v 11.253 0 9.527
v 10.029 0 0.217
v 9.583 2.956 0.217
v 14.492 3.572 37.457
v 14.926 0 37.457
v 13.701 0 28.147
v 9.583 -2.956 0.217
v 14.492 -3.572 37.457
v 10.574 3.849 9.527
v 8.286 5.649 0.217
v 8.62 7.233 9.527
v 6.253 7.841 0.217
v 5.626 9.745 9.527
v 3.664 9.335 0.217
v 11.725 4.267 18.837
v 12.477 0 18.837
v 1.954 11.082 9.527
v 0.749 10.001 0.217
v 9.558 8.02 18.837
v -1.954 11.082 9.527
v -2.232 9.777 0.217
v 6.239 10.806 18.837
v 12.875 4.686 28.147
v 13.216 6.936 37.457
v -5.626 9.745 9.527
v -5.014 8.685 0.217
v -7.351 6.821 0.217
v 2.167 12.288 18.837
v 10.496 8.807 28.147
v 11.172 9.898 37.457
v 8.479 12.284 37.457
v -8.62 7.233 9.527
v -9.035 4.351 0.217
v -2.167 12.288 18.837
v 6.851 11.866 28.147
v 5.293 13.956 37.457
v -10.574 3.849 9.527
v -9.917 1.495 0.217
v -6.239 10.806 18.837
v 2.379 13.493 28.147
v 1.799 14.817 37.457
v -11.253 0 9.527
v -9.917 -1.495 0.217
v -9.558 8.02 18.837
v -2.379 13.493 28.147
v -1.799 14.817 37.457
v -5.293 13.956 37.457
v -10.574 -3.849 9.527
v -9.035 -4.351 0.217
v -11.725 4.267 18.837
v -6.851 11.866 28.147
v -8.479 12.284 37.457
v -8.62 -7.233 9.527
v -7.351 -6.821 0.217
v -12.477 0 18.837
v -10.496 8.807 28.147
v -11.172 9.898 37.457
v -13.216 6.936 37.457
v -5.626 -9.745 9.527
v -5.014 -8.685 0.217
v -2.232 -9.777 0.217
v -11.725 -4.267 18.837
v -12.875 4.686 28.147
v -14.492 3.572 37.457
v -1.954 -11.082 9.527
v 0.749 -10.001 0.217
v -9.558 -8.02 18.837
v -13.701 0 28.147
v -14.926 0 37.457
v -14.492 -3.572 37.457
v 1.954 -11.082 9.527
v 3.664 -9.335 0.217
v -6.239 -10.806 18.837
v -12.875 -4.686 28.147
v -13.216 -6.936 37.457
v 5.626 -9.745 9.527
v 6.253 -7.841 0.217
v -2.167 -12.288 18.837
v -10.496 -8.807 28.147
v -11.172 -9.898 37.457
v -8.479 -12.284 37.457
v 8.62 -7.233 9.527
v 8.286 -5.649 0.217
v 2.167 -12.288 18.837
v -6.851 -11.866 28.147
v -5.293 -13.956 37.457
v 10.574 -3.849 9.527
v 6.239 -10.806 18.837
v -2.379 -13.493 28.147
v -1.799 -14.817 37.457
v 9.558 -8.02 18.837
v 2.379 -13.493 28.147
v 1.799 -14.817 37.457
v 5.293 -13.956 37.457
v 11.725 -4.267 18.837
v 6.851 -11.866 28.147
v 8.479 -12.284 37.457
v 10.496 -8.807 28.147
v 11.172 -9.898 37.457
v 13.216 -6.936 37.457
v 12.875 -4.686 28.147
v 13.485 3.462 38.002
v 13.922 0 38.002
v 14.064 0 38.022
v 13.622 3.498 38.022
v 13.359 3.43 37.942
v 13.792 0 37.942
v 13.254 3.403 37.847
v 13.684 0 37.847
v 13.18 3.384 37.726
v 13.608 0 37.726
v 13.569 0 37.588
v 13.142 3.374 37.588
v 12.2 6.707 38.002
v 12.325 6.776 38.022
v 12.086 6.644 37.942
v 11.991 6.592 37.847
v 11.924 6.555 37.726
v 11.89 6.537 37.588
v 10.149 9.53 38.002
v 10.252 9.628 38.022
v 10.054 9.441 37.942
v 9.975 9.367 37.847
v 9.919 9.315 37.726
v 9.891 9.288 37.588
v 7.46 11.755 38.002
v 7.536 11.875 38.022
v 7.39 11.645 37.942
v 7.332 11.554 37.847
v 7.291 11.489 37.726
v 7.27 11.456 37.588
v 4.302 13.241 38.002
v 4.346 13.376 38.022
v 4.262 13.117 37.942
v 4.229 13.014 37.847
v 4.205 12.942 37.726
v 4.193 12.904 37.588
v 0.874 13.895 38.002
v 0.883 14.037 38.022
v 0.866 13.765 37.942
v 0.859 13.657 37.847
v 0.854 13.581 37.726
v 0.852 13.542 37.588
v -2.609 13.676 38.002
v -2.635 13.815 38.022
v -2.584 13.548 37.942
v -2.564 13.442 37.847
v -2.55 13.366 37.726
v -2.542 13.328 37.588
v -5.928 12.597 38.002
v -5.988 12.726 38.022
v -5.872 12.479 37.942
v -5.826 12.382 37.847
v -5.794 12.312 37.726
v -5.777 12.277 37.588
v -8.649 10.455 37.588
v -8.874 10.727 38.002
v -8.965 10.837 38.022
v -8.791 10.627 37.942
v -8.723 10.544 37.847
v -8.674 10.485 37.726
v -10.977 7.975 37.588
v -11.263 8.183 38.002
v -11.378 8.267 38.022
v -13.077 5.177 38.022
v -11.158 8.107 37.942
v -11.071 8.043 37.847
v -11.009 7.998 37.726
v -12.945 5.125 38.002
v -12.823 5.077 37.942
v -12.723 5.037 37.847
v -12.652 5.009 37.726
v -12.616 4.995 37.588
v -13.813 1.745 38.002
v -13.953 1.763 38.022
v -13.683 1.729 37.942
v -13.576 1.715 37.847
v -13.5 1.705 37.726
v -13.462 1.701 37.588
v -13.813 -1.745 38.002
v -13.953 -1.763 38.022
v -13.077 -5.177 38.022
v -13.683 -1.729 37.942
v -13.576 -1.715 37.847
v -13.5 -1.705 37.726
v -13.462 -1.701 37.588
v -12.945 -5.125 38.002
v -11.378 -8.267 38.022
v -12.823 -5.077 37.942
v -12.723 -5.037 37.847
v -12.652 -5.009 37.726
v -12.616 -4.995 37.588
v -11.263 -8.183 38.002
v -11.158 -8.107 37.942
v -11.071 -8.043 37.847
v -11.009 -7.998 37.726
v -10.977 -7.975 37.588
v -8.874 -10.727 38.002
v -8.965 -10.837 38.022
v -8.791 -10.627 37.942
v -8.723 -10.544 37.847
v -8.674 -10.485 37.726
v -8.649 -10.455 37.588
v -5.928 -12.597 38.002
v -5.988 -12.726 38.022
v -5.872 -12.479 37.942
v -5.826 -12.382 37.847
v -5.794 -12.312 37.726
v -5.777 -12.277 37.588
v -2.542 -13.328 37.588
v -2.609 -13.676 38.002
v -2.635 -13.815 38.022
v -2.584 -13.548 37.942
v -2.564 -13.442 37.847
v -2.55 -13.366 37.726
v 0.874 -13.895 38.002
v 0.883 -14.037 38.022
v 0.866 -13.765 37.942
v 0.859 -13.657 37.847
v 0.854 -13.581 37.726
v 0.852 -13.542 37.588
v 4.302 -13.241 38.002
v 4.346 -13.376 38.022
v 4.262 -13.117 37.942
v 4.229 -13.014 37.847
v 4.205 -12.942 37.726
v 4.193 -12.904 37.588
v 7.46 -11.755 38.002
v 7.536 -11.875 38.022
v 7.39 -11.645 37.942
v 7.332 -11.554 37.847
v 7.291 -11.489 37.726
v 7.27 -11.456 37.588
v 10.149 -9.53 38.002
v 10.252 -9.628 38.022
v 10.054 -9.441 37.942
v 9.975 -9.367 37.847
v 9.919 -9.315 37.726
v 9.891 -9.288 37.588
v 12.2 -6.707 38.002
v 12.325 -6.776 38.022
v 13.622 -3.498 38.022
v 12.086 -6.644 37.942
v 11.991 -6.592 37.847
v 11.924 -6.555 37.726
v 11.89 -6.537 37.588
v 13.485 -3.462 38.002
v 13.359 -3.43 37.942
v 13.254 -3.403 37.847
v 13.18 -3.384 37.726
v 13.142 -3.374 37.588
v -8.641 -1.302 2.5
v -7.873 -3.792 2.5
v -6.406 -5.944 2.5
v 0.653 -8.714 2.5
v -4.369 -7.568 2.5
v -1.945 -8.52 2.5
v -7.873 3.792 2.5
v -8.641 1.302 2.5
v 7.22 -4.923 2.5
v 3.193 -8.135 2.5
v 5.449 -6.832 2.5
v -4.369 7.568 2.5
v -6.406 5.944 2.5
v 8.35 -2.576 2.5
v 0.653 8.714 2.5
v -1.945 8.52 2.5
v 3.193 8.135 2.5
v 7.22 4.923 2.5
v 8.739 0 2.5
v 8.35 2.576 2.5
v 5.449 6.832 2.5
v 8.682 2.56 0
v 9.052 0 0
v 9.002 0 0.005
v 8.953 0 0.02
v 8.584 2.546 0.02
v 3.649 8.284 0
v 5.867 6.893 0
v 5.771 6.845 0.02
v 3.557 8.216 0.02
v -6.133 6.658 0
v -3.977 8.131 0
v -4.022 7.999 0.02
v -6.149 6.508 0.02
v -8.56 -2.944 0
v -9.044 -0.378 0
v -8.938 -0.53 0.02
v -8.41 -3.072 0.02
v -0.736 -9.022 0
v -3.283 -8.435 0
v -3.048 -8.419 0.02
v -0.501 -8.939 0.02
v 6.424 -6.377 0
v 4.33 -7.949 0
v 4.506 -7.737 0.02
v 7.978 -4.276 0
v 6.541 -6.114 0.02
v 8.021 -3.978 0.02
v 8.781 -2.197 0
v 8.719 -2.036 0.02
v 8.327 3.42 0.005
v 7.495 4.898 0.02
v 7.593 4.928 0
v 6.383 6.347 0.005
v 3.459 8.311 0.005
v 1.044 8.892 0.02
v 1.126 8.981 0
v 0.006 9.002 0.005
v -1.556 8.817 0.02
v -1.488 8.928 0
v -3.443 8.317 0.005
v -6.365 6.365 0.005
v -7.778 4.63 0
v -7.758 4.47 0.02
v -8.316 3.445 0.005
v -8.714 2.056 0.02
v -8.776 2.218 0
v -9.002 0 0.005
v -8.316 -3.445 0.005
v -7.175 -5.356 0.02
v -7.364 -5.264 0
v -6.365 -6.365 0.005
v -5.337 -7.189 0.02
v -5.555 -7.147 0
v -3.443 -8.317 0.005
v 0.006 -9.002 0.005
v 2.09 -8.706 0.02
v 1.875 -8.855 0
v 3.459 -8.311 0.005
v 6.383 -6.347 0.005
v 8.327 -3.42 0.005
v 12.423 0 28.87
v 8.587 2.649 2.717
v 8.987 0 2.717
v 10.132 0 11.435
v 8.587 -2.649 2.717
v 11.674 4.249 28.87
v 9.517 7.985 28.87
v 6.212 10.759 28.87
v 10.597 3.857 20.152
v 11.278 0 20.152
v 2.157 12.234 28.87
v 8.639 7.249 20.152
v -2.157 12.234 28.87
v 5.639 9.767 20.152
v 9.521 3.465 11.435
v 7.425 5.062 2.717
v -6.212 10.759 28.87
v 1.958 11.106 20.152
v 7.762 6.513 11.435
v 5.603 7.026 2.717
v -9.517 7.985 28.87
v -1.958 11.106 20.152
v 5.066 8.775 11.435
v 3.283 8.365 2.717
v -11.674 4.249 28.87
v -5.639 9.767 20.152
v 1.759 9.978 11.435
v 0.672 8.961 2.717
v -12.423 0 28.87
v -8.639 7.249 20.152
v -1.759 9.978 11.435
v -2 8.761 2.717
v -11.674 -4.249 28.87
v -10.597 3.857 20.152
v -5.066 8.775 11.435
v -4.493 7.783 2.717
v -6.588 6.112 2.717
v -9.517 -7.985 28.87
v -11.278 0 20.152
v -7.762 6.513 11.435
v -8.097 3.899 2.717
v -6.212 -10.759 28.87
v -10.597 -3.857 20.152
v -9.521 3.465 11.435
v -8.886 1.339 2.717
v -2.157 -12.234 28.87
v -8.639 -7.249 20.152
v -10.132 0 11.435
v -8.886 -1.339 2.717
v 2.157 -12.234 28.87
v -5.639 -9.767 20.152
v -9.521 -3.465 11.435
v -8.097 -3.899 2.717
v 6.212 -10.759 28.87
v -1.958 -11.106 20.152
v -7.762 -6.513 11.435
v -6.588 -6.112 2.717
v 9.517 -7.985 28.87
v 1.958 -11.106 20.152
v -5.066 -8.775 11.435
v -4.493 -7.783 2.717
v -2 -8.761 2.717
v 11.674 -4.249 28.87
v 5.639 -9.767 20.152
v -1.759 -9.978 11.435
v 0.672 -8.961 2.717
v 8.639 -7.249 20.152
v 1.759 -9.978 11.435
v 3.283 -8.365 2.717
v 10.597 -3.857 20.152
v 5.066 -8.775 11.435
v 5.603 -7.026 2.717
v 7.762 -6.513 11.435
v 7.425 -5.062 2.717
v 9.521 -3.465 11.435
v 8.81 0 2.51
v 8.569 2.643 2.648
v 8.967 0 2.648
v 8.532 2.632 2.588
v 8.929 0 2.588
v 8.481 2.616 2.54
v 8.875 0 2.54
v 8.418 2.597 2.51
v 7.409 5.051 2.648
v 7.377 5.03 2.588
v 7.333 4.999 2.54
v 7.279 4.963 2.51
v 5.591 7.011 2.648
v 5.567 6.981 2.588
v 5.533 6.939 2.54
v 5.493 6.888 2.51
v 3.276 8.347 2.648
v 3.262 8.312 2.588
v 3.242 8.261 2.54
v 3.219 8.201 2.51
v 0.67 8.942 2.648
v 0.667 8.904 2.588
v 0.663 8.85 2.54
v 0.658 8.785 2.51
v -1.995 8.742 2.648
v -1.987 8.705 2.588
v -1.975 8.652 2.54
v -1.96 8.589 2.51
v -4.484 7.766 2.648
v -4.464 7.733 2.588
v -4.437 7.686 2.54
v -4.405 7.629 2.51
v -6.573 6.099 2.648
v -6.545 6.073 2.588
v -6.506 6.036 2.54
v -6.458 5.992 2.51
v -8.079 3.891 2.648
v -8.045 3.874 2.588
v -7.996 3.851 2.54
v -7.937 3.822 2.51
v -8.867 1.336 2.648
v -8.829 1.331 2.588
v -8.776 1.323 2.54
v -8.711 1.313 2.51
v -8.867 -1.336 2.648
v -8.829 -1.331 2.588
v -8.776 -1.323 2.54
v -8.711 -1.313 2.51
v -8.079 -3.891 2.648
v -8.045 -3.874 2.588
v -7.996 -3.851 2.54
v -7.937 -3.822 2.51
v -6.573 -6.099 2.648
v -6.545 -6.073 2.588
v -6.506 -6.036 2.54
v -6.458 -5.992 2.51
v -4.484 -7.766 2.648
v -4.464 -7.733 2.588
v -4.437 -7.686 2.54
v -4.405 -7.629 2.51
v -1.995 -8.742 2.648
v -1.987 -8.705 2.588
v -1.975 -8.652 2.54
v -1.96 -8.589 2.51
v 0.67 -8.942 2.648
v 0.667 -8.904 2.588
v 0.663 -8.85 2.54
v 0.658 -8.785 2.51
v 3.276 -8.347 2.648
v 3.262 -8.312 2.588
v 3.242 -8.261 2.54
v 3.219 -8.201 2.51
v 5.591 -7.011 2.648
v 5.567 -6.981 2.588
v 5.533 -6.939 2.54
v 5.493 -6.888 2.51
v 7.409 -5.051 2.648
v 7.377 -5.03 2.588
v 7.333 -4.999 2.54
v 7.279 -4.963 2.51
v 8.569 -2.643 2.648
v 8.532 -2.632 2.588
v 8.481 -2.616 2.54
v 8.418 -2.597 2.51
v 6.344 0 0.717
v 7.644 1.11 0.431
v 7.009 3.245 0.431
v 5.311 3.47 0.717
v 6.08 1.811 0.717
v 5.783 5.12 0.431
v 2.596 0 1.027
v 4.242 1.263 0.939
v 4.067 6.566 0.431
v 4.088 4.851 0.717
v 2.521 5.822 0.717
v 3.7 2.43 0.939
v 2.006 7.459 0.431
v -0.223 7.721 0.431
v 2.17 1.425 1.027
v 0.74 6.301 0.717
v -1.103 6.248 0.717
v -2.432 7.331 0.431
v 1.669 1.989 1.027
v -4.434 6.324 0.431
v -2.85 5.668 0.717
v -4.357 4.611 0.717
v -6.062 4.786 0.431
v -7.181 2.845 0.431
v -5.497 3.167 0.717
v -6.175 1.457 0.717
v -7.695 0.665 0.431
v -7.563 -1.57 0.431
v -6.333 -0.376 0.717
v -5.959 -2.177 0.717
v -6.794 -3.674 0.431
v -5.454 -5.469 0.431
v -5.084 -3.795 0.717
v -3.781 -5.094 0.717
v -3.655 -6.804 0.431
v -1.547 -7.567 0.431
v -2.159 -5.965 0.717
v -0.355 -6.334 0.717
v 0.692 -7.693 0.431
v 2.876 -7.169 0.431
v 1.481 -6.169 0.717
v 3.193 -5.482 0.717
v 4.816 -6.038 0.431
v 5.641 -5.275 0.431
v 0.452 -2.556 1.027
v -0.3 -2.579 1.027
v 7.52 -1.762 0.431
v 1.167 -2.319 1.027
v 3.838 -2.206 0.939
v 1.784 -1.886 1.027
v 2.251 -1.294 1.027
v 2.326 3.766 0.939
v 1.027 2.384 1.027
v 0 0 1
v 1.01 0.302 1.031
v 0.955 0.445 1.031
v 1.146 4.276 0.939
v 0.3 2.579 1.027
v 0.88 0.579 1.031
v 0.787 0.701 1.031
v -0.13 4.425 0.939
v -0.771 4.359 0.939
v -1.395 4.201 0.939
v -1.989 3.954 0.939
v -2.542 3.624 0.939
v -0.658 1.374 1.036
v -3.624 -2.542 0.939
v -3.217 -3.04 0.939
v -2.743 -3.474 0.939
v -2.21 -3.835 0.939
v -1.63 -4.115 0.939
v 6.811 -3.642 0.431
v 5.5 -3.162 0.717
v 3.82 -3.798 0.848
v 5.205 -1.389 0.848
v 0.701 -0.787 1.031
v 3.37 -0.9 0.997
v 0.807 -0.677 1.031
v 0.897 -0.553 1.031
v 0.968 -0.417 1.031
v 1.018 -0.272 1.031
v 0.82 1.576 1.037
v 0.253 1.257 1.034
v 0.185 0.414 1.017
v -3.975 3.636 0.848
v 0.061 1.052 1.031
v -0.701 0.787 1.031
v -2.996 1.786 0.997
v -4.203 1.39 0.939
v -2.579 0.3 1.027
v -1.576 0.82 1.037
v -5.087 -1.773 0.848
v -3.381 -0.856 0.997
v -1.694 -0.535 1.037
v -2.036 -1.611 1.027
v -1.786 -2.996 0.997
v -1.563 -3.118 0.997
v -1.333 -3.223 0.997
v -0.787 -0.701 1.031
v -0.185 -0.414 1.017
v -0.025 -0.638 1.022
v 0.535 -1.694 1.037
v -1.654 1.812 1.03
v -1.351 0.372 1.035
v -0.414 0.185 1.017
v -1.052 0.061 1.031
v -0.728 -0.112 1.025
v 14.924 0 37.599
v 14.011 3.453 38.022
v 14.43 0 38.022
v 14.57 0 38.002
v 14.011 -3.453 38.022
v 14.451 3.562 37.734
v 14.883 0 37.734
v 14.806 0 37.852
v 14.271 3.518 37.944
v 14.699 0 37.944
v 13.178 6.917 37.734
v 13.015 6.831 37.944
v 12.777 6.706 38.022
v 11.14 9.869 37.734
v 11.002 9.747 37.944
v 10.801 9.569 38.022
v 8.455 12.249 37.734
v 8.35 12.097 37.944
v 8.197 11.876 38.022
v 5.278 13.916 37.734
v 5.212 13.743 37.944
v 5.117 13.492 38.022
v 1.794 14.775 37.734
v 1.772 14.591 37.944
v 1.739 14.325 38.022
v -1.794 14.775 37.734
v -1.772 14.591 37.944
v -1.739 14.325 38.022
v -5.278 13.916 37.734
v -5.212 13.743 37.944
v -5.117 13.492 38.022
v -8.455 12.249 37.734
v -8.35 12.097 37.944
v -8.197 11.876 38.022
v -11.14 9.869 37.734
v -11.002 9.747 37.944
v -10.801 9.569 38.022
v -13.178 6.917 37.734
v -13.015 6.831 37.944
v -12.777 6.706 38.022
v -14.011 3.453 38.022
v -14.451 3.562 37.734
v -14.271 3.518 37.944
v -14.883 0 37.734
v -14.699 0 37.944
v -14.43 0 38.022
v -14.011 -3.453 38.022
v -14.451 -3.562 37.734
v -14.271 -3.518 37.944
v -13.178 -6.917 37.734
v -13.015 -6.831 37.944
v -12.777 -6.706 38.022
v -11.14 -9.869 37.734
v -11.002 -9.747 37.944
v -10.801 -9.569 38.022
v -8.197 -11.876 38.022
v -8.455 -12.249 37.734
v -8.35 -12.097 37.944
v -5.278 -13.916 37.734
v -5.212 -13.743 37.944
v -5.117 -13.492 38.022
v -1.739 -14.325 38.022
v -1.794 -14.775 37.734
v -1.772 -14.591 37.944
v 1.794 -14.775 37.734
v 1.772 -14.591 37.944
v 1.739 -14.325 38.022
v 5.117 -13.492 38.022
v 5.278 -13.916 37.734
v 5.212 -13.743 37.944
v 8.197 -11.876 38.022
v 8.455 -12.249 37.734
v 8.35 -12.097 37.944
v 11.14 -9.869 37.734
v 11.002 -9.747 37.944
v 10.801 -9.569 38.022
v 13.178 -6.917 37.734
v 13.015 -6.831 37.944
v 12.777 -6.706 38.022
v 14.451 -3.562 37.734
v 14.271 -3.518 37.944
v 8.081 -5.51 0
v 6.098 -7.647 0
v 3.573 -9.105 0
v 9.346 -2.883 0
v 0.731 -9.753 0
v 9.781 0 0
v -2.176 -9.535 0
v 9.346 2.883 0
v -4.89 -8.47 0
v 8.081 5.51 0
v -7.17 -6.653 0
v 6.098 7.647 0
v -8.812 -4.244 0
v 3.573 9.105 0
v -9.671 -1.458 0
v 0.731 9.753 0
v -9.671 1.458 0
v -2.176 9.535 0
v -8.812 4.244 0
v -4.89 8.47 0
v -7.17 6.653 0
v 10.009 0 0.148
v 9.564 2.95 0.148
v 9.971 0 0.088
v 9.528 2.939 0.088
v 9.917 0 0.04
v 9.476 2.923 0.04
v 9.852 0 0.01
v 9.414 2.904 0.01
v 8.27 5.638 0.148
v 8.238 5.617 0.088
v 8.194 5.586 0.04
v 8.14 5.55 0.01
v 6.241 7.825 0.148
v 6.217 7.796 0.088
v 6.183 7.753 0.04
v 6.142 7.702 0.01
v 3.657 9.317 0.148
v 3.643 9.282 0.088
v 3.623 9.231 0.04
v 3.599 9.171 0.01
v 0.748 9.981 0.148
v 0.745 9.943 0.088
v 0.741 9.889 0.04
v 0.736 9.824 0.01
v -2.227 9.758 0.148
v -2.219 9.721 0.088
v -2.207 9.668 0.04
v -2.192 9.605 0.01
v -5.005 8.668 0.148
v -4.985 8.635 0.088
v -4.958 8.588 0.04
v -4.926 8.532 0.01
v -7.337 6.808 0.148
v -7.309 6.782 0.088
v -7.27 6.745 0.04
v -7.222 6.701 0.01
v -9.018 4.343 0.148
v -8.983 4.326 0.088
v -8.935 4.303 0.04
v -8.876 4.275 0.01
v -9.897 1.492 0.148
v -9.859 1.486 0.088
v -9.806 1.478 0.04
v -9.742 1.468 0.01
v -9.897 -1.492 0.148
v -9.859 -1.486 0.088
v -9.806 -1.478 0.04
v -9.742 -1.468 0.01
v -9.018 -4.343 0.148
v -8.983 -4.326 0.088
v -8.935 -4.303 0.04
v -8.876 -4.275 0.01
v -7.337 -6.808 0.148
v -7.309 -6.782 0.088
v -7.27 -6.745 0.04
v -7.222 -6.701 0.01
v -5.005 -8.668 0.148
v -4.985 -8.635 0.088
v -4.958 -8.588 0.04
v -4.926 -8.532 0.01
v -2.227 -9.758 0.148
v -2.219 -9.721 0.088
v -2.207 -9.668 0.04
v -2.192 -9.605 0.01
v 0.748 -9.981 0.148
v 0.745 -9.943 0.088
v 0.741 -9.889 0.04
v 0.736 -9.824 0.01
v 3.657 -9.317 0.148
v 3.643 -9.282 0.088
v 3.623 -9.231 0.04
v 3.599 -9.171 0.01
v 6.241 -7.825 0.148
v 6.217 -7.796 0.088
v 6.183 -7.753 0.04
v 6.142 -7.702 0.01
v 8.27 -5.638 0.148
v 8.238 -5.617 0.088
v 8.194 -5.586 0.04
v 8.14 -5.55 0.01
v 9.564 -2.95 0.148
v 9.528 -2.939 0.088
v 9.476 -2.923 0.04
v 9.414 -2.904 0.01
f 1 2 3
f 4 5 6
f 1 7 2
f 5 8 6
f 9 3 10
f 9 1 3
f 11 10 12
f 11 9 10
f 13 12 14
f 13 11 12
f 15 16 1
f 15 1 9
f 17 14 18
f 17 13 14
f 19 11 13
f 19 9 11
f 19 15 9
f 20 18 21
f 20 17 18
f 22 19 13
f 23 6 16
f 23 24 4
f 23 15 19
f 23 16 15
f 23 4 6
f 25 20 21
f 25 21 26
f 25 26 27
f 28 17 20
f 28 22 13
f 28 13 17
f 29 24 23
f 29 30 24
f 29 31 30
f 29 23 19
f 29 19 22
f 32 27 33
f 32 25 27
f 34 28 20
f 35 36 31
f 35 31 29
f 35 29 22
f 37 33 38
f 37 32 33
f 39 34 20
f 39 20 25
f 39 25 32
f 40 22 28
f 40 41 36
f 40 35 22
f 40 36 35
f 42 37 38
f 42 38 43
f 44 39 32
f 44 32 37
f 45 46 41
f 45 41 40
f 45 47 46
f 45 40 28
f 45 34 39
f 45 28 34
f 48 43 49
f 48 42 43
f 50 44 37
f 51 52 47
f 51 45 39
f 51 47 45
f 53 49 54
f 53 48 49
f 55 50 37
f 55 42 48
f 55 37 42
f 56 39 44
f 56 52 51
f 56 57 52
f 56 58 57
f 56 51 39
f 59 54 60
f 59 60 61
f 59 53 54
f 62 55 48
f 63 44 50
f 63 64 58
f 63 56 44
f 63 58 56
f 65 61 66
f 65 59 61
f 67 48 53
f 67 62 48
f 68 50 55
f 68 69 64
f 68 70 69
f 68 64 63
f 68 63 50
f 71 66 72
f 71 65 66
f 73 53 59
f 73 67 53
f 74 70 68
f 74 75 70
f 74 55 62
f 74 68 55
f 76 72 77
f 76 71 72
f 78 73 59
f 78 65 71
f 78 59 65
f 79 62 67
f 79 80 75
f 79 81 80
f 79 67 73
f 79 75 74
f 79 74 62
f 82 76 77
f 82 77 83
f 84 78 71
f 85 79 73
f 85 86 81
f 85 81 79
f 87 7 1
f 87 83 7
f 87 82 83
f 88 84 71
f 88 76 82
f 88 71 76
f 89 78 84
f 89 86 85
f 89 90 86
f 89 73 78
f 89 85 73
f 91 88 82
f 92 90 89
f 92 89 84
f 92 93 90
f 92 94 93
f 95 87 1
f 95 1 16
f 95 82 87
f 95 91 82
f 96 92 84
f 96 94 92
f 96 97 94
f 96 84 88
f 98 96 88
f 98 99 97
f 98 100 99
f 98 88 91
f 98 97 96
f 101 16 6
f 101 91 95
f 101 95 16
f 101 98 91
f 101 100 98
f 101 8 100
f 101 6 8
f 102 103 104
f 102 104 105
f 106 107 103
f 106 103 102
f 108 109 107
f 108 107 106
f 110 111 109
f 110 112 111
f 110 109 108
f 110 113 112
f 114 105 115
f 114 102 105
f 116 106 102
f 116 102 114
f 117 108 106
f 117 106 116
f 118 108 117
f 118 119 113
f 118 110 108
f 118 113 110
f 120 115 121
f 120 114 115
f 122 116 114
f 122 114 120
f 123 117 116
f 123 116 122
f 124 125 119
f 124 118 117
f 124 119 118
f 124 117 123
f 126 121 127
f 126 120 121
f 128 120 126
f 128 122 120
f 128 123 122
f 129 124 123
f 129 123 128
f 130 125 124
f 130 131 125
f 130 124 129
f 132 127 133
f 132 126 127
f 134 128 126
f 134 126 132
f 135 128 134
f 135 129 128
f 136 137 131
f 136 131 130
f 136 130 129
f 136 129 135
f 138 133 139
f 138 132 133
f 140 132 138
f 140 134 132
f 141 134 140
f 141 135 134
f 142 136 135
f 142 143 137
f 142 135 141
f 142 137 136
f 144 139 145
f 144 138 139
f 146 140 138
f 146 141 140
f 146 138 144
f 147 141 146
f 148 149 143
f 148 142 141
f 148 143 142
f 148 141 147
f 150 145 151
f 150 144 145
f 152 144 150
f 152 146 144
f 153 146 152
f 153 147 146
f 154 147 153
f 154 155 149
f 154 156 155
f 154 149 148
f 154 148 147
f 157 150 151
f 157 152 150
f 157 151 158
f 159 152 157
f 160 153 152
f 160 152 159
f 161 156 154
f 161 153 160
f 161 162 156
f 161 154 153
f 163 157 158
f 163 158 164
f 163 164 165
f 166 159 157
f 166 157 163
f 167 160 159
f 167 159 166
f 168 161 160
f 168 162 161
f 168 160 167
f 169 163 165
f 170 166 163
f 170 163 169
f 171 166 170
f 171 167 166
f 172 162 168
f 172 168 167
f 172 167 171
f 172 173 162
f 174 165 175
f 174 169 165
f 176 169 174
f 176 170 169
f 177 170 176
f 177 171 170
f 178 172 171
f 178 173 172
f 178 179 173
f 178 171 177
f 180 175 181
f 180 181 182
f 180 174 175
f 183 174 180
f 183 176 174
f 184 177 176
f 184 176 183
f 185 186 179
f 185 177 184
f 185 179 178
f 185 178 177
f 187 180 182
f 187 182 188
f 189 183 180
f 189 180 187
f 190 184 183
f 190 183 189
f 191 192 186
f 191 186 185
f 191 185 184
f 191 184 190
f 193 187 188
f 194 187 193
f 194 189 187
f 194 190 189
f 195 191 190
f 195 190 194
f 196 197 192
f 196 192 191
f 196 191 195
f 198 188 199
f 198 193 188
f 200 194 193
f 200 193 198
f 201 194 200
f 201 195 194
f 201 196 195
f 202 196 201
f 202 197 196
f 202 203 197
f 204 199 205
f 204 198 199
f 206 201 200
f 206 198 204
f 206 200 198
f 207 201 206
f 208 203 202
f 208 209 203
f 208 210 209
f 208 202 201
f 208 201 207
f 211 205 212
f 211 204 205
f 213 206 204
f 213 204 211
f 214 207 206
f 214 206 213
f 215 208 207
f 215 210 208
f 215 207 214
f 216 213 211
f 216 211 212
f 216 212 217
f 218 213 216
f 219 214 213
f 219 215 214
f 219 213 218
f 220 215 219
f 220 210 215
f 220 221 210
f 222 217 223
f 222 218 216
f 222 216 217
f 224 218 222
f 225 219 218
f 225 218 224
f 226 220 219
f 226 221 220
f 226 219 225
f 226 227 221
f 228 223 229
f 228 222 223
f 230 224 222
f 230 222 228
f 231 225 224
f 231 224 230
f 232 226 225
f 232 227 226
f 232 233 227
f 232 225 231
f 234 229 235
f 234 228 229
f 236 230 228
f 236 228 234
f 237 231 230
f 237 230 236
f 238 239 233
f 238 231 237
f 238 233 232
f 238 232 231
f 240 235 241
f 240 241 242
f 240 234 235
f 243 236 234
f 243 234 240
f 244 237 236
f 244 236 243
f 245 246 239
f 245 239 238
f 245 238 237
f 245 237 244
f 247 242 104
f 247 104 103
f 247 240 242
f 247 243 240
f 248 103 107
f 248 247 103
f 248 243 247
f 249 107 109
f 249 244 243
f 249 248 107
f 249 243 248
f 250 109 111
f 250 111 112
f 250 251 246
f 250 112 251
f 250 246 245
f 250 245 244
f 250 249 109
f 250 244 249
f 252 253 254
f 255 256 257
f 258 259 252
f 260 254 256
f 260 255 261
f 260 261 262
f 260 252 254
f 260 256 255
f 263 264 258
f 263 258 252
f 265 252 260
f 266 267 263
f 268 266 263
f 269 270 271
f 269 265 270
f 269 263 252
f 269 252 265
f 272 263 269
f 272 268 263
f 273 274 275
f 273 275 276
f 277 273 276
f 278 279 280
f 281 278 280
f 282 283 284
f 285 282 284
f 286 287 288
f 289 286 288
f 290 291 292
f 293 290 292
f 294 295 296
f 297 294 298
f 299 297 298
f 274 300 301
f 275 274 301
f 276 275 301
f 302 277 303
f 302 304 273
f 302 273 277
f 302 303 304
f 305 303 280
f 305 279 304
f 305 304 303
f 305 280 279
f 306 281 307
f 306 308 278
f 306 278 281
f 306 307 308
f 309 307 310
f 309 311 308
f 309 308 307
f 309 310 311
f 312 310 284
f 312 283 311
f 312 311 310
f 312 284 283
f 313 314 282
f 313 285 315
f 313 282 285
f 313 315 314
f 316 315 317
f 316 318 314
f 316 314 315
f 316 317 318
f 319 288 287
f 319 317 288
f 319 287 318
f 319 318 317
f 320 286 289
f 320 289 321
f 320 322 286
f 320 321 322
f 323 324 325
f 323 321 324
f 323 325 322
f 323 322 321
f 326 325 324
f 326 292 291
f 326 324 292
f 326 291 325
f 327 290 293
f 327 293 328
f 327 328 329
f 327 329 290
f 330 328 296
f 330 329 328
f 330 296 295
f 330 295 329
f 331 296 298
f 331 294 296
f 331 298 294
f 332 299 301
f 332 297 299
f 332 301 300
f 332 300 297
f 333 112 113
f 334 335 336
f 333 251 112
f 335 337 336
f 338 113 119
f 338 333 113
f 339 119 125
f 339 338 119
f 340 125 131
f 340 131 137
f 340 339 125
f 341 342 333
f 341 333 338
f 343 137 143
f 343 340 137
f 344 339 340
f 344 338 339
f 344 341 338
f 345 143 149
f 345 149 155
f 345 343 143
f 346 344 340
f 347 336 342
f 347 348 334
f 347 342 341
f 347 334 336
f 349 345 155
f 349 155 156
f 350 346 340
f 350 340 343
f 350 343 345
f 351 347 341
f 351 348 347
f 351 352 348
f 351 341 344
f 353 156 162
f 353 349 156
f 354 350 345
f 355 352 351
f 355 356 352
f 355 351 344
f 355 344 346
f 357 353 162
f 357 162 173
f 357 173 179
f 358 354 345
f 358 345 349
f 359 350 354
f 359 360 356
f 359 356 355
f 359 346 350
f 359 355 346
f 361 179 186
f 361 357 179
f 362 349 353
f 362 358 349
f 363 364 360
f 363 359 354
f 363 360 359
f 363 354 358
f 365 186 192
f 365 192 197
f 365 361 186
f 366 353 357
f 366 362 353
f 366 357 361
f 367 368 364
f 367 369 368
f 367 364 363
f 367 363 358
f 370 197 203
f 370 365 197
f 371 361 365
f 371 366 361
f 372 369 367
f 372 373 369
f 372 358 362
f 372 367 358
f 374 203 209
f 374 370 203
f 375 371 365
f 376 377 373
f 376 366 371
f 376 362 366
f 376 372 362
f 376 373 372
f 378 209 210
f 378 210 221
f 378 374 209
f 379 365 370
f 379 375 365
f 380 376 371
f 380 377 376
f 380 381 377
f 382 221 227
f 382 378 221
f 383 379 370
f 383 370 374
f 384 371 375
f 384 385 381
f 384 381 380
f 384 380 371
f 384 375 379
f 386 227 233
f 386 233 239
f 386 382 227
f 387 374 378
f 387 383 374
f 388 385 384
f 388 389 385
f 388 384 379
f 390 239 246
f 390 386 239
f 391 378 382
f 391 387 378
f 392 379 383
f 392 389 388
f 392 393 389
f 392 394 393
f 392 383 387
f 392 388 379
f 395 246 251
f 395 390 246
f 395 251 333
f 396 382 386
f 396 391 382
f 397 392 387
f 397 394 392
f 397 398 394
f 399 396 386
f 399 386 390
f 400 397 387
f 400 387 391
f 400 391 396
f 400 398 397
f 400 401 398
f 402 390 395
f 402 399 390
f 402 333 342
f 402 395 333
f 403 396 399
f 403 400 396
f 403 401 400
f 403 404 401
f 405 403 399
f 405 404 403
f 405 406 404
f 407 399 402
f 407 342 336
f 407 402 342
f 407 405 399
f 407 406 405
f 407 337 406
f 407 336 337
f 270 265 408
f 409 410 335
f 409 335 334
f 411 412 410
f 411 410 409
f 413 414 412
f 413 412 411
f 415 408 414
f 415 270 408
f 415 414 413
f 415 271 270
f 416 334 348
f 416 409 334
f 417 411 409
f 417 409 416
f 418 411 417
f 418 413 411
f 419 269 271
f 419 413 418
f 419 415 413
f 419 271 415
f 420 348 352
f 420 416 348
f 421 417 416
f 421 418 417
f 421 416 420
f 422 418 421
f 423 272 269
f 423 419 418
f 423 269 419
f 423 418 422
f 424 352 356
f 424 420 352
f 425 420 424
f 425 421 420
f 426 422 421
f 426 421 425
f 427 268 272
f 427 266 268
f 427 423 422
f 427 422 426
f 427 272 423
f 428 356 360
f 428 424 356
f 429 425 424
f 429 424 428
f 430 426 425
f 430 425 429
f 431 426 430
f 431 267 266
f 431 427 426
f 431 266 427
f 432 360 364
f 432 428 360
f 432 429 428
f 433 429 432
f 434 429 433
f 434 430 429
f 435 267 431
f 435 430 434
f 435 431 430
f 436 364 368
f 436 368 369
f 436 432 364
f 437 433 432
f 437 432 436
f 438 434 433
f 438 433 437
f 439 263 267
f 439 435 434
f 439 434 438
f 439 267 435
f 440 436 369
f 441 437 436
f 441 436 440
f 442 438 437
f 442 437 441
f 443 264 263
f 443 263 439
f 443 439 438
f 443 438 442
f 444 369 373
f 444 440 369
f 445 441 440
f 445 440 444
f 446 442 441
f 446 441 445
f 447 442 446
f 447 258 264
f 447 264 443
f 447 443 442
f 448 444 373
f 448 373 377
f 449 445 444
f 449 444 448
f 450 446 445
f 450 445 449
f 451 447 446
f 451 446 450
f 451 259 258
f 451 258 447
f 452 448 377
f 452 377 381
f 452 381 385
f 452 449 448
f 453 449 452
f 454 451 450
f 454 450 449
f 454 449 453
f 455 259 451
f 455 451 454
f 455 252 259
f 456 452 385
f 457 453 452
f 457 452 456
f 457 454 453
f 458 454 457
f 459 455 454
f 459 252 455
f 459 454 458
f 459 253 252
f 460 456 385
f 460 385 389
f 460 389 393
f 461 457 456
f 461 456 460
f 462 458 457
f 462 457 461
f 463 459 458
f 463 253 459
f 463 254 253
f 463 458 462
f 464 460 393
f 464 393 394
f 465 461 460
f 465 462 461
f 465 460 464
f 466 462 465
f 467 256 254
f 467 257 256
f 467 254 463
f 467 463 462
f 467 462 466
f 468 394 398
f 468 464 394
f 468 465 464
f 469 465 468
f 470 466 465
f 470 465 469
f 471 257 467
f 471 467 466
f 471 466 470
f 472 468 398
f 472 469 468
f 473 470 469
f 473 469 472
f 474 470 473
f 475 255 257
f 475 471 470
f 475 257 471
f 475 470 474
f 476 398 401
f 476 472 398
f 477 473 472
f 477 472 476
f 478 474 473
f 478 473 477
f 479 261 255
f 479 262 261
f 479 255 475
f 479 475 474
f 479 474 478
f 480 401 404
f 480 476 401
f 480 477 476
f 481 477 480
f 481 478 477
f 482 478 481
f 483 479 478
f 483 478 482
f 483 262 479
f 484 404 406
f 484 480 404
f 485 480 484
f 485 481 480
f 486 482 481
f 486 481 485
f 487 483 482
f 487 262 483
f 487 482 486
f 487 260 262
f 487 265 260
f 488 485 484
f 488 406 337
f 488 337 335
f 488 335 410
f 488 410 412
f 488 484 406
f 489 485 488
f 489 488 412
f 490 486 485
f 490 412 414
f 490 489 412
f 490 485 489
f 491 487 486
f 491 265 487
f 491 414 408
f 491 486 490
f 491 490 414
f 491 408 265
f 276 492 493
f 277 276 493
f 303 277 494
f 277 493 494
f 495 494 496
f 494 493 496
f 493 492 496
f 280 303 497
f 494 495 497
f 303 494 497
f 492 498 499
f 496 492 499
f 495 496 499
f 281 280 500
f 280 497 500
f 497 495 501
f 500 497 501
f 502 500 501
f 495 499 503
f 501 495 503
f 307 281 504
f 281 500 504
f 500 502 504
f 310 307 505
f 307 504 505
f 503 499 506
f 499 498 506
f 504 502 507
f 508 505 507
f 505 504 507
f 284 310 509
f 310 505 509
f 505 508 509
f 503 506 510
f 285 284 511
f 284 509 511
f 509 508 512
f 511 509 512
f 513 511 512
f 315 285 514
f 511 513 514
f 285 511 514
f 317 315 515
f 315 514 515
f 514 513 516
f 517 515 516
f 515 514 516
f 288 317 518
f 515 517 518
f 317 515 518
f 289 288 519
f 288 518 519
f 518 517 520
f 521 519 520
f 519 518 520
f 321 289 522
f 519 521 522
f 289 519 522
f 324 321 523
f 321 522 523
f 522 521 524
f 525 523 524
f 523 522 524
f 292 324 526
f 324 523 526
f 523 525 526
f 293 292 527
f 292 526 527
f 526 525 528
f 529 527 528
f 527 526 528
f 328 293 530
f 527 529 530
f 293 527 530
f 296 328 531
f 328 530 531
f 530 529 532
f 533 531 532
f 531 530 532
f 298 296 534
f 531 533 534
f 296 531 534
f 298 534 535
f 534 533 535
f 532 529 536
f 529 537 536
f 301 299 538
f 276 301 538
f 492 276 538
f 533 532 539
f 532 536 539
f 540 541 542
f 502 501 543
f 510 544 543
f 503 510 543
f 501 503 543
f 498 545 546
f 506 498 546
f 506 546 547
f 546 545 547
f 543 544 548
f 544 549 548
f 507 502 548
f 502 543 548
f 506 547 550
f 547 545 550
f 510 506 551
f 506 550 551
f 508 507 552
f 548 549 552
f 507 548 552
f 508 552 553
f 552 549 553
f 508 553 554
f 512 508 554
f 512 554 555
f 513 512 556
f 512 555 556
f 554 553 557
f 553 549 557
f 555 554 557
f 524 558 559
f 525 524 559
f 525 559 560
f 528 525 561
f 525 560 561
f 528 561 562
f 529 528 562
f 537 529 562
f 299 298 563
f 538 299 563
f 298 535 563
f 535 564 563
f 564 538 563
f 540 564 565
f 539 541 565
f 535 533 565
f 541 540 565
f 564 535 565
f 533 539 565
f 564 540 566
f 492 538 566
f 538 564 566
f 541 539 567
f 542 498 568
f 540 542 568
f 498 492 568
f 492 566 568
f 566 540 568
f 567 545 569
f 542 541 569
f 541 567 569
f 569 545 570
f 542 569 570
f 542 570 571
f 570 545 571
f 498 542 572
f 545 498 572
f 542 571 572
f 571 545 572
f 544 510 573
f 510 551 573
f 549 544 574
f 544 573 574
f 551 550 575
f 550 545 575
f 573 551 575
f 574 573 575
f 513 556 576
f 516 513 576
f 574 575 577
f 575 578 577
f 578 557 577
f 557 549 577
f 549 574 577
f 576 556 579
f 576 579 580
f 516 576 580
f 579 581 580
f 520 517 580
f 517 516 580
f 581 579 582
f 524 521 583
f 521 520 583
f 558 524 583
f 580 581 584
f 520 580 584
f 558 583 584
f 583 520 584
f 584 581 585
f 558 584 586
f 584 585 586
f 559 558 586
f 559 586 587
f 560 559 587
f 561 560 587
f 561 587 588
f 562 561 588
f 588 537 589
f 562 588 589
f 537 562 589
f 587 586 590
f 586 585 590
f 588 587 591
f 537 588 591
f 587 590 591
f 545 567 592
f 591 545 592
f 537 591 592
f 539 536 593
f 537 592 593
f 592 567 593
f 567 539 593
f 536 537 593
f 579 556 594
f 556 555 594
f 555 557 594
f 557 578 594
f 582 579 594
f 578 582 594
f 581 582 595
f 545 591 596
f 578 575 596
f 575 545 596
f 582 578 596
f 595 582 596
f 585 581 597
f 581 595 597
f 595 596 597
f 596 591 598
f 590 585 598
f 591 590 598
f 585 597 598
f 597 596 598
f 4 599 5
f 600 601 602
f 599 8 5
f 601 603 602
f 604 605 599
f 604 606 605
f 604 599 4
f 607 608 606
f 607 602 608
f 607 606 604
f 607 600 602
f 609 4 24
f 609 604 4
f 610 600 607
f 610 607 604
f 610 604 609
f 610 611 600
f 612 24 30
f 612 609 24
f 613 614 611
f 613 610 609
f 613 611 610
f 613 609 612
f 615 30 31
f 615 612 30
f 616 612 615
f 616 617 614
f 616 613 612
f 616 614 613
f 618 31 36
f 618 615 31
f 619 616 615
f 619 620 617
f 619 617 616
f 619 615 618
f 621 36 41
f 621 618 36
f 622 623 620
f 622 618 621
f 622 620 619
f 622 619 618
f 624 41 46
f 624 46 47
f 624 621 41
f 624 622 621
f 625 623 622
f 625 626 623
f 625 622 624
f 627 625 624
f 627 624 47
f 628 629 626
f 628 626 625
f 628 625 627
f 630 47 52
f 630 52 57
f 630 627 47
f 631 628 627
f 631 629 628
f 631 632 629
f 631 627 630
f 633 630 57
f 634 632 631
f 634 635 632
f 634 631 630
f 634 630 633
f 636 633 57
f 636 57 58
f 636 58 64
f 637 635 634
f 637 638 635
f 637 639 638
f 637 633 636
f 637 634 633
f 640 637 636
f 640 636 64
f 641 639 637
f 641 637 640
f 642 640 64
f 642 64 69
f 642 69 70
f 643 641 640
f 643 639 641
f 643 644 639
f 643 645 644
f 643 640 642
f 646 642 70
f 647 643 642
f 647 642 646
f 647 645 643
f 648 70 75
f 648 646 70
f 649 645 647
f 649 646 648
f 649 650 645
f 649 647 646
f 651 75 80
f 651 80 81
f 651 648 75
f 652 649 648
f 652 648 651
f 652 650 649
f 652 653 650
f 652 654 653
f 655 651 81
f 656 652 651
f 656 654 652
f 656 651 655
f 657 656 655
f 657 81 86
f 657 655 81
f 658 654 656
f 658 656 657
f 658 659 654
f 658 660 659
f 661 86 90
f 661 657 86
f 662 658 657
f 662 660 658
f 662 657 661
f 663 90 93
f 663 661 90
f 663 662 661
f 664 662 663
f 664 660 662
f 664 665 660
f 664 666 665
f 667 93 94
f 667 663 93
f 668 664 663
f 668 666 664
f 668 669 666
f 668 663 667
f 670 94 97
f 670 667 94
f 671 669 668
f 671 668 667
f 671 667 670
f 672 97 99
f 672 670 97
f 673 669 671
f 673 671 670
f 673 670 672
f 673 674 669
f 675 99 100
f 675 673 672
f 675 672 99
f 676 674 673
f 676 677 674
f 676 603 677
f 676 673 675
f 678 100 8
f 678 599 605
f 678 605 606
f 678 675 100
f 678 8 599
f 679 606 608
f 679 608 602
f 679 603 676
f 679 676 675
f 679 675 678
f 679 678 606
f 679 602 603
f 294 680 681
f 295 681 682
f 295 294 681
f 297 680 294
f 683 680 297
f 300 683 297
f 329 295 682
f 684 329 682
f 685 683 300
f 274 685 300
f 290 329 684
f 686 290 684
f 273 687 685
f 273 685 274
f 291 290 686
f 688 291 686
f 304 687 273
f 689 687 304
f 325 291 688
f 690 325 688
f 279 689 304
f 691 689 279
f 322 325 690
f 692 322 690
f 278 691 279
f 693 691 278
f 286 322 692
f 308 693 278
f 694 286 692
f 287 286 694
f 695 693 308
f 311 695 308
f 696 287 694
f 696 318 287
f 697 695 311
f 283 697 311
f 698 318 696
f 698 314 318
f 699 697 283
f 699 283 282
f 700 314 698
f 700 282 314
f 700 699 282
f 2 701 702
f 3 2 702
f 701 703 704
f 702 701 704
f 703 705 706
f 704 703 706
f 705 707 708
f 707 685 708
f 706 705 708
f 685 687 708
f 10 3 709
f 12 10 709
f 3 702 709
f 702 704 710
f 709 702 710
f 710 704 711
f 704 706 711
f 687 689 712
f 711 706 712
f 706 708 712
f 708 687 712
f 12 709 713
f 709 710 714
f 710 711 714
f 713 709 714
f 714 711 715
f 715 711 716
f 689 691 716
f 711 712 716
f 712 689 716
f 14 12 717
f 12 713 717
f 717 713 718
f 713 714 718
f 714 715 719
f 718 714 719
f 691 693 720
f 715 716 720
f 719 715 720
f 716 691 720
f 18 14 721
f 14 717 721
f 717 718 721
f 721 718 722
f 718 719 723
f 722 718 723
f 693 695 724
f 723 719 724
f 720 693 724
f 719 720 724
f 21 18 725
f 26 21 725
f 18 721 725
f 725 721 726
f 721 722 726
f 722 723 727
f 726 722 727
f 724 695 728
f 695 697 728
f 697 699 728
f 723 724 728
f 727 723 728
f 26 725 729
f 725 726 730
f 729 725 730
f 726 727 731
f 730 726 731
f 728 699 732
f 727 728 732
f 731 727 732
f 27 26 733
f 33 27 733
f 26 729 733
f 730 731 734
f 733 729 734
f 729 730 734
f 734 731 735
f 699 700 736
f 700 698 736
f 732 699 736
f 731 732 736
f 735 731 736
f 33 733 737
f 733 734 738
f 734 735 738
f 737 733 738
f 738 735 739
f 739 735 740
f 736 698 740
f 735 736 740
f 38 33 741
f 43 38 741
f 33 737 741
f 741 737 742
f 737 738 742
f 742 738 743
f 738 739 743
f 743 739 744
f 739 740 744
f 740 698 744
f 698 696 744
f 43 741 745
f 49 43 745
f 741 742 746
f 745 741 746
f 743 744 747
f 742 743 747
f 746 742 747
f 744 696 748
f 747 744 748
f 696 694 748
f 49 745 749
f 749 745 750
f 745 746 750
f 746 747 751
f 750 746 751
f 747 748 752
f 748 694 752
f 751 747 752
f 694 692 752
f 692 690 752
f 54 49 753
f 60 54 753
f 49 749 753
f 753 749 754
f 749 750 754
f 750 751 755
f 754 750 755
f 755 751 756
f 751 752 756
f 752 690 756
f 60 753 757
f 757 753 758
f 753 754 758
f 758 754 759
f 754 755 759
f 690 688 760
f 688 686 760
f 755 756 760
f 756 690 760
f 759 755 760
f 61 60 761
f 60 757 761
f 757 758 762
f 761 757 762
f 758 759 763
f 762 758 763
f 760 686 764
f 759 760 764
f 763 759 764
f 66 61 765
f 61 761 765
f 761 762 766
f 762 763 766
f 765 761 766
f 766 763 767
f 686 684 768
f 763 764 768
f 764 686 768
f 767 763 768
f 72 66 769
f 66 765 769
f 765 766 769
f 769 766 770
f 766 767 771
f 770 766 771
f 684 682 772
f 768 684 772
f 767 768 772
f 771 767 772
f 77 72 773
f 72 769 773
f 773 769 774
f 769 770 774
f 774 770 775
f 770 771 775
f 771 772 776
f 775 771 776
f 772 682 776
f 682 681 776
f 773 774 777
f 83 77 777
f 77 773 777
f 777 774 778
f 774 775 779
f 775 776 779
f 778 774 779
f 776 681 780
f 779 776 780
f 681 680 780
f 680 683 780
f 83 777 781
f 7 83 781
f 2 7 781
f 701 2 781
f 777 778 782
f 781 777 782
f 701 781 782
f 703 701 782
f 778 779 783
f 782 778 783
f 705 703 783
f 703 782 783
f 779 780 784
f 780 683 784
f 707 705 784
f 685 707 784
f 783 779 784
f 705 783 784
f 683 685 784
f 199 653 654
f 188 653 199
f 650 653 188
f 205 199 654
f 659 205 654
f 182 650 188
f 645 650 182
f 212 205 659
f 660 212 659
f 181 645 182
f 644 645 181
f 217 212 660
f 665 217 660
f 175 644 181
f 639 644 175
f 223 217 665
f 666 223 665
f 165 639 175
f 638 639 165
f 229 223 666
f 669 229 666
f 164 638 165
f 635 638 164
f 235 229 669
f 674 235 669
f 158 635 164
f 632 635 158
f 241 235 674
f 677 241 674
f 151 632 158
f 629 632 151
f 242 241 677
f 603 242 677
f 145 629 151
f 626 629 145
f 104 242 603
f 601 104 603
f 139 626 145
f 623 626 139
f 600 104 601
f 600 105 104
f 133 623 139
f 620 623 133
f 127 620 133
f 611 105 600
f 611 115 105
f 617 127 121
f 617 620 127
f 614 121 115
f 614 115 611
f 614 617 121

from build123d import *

# Parameters (mm, degrees)
F2_R = 0.5
F3_R = 0.25


with BuildPart() as f1:
    # F0 (on Front) → F1 (revolve)
    with BuildSketch(Plane.XZ):
        with BuildLine():
            Line((9, 0), (10, 0))
            Line((10, 0), (15, 38.022425))
            Line((15, 38.022425), (13.625722, 38.022425))
            Line((13.625722, 38.022425), (8.958023, 2.5))
            Line((8.958023, 2.5), (0, 2.5))
            Line((0, 2.5), (0, 1))
            add(Edge.make_bspline(
                [(9, 0), (6.263342, 1.193833), (1.370298, 1.058621), (0, 1)],
                knots=[0, 0, 0, 0, 9.055385, 9.055385, 9.055385, 9.055385], degree=3))
        make_face()
    revolve(axis=Axis((0, 0, 1.75), (0, 0, 1)))

    # F2
    f2_edges = [f1.edges().sort_by_distance(p)[0] for p in [
        (-13.625722, 0, 38.022425),
        (-15, 0, 38.022425),
    ]]
    fillet(f2_edges, radius=F2_R)

    # F3
    f3_edges = [f1.edges().sort_by_distance(p)[0] for p in [
        (-8.958023, 0, 2.5),
        (-9, 0, 0),
        (-10, 0, 0),
    ]]
    fillet(f3_edges, radius=F3_R)


solid = f1.part
